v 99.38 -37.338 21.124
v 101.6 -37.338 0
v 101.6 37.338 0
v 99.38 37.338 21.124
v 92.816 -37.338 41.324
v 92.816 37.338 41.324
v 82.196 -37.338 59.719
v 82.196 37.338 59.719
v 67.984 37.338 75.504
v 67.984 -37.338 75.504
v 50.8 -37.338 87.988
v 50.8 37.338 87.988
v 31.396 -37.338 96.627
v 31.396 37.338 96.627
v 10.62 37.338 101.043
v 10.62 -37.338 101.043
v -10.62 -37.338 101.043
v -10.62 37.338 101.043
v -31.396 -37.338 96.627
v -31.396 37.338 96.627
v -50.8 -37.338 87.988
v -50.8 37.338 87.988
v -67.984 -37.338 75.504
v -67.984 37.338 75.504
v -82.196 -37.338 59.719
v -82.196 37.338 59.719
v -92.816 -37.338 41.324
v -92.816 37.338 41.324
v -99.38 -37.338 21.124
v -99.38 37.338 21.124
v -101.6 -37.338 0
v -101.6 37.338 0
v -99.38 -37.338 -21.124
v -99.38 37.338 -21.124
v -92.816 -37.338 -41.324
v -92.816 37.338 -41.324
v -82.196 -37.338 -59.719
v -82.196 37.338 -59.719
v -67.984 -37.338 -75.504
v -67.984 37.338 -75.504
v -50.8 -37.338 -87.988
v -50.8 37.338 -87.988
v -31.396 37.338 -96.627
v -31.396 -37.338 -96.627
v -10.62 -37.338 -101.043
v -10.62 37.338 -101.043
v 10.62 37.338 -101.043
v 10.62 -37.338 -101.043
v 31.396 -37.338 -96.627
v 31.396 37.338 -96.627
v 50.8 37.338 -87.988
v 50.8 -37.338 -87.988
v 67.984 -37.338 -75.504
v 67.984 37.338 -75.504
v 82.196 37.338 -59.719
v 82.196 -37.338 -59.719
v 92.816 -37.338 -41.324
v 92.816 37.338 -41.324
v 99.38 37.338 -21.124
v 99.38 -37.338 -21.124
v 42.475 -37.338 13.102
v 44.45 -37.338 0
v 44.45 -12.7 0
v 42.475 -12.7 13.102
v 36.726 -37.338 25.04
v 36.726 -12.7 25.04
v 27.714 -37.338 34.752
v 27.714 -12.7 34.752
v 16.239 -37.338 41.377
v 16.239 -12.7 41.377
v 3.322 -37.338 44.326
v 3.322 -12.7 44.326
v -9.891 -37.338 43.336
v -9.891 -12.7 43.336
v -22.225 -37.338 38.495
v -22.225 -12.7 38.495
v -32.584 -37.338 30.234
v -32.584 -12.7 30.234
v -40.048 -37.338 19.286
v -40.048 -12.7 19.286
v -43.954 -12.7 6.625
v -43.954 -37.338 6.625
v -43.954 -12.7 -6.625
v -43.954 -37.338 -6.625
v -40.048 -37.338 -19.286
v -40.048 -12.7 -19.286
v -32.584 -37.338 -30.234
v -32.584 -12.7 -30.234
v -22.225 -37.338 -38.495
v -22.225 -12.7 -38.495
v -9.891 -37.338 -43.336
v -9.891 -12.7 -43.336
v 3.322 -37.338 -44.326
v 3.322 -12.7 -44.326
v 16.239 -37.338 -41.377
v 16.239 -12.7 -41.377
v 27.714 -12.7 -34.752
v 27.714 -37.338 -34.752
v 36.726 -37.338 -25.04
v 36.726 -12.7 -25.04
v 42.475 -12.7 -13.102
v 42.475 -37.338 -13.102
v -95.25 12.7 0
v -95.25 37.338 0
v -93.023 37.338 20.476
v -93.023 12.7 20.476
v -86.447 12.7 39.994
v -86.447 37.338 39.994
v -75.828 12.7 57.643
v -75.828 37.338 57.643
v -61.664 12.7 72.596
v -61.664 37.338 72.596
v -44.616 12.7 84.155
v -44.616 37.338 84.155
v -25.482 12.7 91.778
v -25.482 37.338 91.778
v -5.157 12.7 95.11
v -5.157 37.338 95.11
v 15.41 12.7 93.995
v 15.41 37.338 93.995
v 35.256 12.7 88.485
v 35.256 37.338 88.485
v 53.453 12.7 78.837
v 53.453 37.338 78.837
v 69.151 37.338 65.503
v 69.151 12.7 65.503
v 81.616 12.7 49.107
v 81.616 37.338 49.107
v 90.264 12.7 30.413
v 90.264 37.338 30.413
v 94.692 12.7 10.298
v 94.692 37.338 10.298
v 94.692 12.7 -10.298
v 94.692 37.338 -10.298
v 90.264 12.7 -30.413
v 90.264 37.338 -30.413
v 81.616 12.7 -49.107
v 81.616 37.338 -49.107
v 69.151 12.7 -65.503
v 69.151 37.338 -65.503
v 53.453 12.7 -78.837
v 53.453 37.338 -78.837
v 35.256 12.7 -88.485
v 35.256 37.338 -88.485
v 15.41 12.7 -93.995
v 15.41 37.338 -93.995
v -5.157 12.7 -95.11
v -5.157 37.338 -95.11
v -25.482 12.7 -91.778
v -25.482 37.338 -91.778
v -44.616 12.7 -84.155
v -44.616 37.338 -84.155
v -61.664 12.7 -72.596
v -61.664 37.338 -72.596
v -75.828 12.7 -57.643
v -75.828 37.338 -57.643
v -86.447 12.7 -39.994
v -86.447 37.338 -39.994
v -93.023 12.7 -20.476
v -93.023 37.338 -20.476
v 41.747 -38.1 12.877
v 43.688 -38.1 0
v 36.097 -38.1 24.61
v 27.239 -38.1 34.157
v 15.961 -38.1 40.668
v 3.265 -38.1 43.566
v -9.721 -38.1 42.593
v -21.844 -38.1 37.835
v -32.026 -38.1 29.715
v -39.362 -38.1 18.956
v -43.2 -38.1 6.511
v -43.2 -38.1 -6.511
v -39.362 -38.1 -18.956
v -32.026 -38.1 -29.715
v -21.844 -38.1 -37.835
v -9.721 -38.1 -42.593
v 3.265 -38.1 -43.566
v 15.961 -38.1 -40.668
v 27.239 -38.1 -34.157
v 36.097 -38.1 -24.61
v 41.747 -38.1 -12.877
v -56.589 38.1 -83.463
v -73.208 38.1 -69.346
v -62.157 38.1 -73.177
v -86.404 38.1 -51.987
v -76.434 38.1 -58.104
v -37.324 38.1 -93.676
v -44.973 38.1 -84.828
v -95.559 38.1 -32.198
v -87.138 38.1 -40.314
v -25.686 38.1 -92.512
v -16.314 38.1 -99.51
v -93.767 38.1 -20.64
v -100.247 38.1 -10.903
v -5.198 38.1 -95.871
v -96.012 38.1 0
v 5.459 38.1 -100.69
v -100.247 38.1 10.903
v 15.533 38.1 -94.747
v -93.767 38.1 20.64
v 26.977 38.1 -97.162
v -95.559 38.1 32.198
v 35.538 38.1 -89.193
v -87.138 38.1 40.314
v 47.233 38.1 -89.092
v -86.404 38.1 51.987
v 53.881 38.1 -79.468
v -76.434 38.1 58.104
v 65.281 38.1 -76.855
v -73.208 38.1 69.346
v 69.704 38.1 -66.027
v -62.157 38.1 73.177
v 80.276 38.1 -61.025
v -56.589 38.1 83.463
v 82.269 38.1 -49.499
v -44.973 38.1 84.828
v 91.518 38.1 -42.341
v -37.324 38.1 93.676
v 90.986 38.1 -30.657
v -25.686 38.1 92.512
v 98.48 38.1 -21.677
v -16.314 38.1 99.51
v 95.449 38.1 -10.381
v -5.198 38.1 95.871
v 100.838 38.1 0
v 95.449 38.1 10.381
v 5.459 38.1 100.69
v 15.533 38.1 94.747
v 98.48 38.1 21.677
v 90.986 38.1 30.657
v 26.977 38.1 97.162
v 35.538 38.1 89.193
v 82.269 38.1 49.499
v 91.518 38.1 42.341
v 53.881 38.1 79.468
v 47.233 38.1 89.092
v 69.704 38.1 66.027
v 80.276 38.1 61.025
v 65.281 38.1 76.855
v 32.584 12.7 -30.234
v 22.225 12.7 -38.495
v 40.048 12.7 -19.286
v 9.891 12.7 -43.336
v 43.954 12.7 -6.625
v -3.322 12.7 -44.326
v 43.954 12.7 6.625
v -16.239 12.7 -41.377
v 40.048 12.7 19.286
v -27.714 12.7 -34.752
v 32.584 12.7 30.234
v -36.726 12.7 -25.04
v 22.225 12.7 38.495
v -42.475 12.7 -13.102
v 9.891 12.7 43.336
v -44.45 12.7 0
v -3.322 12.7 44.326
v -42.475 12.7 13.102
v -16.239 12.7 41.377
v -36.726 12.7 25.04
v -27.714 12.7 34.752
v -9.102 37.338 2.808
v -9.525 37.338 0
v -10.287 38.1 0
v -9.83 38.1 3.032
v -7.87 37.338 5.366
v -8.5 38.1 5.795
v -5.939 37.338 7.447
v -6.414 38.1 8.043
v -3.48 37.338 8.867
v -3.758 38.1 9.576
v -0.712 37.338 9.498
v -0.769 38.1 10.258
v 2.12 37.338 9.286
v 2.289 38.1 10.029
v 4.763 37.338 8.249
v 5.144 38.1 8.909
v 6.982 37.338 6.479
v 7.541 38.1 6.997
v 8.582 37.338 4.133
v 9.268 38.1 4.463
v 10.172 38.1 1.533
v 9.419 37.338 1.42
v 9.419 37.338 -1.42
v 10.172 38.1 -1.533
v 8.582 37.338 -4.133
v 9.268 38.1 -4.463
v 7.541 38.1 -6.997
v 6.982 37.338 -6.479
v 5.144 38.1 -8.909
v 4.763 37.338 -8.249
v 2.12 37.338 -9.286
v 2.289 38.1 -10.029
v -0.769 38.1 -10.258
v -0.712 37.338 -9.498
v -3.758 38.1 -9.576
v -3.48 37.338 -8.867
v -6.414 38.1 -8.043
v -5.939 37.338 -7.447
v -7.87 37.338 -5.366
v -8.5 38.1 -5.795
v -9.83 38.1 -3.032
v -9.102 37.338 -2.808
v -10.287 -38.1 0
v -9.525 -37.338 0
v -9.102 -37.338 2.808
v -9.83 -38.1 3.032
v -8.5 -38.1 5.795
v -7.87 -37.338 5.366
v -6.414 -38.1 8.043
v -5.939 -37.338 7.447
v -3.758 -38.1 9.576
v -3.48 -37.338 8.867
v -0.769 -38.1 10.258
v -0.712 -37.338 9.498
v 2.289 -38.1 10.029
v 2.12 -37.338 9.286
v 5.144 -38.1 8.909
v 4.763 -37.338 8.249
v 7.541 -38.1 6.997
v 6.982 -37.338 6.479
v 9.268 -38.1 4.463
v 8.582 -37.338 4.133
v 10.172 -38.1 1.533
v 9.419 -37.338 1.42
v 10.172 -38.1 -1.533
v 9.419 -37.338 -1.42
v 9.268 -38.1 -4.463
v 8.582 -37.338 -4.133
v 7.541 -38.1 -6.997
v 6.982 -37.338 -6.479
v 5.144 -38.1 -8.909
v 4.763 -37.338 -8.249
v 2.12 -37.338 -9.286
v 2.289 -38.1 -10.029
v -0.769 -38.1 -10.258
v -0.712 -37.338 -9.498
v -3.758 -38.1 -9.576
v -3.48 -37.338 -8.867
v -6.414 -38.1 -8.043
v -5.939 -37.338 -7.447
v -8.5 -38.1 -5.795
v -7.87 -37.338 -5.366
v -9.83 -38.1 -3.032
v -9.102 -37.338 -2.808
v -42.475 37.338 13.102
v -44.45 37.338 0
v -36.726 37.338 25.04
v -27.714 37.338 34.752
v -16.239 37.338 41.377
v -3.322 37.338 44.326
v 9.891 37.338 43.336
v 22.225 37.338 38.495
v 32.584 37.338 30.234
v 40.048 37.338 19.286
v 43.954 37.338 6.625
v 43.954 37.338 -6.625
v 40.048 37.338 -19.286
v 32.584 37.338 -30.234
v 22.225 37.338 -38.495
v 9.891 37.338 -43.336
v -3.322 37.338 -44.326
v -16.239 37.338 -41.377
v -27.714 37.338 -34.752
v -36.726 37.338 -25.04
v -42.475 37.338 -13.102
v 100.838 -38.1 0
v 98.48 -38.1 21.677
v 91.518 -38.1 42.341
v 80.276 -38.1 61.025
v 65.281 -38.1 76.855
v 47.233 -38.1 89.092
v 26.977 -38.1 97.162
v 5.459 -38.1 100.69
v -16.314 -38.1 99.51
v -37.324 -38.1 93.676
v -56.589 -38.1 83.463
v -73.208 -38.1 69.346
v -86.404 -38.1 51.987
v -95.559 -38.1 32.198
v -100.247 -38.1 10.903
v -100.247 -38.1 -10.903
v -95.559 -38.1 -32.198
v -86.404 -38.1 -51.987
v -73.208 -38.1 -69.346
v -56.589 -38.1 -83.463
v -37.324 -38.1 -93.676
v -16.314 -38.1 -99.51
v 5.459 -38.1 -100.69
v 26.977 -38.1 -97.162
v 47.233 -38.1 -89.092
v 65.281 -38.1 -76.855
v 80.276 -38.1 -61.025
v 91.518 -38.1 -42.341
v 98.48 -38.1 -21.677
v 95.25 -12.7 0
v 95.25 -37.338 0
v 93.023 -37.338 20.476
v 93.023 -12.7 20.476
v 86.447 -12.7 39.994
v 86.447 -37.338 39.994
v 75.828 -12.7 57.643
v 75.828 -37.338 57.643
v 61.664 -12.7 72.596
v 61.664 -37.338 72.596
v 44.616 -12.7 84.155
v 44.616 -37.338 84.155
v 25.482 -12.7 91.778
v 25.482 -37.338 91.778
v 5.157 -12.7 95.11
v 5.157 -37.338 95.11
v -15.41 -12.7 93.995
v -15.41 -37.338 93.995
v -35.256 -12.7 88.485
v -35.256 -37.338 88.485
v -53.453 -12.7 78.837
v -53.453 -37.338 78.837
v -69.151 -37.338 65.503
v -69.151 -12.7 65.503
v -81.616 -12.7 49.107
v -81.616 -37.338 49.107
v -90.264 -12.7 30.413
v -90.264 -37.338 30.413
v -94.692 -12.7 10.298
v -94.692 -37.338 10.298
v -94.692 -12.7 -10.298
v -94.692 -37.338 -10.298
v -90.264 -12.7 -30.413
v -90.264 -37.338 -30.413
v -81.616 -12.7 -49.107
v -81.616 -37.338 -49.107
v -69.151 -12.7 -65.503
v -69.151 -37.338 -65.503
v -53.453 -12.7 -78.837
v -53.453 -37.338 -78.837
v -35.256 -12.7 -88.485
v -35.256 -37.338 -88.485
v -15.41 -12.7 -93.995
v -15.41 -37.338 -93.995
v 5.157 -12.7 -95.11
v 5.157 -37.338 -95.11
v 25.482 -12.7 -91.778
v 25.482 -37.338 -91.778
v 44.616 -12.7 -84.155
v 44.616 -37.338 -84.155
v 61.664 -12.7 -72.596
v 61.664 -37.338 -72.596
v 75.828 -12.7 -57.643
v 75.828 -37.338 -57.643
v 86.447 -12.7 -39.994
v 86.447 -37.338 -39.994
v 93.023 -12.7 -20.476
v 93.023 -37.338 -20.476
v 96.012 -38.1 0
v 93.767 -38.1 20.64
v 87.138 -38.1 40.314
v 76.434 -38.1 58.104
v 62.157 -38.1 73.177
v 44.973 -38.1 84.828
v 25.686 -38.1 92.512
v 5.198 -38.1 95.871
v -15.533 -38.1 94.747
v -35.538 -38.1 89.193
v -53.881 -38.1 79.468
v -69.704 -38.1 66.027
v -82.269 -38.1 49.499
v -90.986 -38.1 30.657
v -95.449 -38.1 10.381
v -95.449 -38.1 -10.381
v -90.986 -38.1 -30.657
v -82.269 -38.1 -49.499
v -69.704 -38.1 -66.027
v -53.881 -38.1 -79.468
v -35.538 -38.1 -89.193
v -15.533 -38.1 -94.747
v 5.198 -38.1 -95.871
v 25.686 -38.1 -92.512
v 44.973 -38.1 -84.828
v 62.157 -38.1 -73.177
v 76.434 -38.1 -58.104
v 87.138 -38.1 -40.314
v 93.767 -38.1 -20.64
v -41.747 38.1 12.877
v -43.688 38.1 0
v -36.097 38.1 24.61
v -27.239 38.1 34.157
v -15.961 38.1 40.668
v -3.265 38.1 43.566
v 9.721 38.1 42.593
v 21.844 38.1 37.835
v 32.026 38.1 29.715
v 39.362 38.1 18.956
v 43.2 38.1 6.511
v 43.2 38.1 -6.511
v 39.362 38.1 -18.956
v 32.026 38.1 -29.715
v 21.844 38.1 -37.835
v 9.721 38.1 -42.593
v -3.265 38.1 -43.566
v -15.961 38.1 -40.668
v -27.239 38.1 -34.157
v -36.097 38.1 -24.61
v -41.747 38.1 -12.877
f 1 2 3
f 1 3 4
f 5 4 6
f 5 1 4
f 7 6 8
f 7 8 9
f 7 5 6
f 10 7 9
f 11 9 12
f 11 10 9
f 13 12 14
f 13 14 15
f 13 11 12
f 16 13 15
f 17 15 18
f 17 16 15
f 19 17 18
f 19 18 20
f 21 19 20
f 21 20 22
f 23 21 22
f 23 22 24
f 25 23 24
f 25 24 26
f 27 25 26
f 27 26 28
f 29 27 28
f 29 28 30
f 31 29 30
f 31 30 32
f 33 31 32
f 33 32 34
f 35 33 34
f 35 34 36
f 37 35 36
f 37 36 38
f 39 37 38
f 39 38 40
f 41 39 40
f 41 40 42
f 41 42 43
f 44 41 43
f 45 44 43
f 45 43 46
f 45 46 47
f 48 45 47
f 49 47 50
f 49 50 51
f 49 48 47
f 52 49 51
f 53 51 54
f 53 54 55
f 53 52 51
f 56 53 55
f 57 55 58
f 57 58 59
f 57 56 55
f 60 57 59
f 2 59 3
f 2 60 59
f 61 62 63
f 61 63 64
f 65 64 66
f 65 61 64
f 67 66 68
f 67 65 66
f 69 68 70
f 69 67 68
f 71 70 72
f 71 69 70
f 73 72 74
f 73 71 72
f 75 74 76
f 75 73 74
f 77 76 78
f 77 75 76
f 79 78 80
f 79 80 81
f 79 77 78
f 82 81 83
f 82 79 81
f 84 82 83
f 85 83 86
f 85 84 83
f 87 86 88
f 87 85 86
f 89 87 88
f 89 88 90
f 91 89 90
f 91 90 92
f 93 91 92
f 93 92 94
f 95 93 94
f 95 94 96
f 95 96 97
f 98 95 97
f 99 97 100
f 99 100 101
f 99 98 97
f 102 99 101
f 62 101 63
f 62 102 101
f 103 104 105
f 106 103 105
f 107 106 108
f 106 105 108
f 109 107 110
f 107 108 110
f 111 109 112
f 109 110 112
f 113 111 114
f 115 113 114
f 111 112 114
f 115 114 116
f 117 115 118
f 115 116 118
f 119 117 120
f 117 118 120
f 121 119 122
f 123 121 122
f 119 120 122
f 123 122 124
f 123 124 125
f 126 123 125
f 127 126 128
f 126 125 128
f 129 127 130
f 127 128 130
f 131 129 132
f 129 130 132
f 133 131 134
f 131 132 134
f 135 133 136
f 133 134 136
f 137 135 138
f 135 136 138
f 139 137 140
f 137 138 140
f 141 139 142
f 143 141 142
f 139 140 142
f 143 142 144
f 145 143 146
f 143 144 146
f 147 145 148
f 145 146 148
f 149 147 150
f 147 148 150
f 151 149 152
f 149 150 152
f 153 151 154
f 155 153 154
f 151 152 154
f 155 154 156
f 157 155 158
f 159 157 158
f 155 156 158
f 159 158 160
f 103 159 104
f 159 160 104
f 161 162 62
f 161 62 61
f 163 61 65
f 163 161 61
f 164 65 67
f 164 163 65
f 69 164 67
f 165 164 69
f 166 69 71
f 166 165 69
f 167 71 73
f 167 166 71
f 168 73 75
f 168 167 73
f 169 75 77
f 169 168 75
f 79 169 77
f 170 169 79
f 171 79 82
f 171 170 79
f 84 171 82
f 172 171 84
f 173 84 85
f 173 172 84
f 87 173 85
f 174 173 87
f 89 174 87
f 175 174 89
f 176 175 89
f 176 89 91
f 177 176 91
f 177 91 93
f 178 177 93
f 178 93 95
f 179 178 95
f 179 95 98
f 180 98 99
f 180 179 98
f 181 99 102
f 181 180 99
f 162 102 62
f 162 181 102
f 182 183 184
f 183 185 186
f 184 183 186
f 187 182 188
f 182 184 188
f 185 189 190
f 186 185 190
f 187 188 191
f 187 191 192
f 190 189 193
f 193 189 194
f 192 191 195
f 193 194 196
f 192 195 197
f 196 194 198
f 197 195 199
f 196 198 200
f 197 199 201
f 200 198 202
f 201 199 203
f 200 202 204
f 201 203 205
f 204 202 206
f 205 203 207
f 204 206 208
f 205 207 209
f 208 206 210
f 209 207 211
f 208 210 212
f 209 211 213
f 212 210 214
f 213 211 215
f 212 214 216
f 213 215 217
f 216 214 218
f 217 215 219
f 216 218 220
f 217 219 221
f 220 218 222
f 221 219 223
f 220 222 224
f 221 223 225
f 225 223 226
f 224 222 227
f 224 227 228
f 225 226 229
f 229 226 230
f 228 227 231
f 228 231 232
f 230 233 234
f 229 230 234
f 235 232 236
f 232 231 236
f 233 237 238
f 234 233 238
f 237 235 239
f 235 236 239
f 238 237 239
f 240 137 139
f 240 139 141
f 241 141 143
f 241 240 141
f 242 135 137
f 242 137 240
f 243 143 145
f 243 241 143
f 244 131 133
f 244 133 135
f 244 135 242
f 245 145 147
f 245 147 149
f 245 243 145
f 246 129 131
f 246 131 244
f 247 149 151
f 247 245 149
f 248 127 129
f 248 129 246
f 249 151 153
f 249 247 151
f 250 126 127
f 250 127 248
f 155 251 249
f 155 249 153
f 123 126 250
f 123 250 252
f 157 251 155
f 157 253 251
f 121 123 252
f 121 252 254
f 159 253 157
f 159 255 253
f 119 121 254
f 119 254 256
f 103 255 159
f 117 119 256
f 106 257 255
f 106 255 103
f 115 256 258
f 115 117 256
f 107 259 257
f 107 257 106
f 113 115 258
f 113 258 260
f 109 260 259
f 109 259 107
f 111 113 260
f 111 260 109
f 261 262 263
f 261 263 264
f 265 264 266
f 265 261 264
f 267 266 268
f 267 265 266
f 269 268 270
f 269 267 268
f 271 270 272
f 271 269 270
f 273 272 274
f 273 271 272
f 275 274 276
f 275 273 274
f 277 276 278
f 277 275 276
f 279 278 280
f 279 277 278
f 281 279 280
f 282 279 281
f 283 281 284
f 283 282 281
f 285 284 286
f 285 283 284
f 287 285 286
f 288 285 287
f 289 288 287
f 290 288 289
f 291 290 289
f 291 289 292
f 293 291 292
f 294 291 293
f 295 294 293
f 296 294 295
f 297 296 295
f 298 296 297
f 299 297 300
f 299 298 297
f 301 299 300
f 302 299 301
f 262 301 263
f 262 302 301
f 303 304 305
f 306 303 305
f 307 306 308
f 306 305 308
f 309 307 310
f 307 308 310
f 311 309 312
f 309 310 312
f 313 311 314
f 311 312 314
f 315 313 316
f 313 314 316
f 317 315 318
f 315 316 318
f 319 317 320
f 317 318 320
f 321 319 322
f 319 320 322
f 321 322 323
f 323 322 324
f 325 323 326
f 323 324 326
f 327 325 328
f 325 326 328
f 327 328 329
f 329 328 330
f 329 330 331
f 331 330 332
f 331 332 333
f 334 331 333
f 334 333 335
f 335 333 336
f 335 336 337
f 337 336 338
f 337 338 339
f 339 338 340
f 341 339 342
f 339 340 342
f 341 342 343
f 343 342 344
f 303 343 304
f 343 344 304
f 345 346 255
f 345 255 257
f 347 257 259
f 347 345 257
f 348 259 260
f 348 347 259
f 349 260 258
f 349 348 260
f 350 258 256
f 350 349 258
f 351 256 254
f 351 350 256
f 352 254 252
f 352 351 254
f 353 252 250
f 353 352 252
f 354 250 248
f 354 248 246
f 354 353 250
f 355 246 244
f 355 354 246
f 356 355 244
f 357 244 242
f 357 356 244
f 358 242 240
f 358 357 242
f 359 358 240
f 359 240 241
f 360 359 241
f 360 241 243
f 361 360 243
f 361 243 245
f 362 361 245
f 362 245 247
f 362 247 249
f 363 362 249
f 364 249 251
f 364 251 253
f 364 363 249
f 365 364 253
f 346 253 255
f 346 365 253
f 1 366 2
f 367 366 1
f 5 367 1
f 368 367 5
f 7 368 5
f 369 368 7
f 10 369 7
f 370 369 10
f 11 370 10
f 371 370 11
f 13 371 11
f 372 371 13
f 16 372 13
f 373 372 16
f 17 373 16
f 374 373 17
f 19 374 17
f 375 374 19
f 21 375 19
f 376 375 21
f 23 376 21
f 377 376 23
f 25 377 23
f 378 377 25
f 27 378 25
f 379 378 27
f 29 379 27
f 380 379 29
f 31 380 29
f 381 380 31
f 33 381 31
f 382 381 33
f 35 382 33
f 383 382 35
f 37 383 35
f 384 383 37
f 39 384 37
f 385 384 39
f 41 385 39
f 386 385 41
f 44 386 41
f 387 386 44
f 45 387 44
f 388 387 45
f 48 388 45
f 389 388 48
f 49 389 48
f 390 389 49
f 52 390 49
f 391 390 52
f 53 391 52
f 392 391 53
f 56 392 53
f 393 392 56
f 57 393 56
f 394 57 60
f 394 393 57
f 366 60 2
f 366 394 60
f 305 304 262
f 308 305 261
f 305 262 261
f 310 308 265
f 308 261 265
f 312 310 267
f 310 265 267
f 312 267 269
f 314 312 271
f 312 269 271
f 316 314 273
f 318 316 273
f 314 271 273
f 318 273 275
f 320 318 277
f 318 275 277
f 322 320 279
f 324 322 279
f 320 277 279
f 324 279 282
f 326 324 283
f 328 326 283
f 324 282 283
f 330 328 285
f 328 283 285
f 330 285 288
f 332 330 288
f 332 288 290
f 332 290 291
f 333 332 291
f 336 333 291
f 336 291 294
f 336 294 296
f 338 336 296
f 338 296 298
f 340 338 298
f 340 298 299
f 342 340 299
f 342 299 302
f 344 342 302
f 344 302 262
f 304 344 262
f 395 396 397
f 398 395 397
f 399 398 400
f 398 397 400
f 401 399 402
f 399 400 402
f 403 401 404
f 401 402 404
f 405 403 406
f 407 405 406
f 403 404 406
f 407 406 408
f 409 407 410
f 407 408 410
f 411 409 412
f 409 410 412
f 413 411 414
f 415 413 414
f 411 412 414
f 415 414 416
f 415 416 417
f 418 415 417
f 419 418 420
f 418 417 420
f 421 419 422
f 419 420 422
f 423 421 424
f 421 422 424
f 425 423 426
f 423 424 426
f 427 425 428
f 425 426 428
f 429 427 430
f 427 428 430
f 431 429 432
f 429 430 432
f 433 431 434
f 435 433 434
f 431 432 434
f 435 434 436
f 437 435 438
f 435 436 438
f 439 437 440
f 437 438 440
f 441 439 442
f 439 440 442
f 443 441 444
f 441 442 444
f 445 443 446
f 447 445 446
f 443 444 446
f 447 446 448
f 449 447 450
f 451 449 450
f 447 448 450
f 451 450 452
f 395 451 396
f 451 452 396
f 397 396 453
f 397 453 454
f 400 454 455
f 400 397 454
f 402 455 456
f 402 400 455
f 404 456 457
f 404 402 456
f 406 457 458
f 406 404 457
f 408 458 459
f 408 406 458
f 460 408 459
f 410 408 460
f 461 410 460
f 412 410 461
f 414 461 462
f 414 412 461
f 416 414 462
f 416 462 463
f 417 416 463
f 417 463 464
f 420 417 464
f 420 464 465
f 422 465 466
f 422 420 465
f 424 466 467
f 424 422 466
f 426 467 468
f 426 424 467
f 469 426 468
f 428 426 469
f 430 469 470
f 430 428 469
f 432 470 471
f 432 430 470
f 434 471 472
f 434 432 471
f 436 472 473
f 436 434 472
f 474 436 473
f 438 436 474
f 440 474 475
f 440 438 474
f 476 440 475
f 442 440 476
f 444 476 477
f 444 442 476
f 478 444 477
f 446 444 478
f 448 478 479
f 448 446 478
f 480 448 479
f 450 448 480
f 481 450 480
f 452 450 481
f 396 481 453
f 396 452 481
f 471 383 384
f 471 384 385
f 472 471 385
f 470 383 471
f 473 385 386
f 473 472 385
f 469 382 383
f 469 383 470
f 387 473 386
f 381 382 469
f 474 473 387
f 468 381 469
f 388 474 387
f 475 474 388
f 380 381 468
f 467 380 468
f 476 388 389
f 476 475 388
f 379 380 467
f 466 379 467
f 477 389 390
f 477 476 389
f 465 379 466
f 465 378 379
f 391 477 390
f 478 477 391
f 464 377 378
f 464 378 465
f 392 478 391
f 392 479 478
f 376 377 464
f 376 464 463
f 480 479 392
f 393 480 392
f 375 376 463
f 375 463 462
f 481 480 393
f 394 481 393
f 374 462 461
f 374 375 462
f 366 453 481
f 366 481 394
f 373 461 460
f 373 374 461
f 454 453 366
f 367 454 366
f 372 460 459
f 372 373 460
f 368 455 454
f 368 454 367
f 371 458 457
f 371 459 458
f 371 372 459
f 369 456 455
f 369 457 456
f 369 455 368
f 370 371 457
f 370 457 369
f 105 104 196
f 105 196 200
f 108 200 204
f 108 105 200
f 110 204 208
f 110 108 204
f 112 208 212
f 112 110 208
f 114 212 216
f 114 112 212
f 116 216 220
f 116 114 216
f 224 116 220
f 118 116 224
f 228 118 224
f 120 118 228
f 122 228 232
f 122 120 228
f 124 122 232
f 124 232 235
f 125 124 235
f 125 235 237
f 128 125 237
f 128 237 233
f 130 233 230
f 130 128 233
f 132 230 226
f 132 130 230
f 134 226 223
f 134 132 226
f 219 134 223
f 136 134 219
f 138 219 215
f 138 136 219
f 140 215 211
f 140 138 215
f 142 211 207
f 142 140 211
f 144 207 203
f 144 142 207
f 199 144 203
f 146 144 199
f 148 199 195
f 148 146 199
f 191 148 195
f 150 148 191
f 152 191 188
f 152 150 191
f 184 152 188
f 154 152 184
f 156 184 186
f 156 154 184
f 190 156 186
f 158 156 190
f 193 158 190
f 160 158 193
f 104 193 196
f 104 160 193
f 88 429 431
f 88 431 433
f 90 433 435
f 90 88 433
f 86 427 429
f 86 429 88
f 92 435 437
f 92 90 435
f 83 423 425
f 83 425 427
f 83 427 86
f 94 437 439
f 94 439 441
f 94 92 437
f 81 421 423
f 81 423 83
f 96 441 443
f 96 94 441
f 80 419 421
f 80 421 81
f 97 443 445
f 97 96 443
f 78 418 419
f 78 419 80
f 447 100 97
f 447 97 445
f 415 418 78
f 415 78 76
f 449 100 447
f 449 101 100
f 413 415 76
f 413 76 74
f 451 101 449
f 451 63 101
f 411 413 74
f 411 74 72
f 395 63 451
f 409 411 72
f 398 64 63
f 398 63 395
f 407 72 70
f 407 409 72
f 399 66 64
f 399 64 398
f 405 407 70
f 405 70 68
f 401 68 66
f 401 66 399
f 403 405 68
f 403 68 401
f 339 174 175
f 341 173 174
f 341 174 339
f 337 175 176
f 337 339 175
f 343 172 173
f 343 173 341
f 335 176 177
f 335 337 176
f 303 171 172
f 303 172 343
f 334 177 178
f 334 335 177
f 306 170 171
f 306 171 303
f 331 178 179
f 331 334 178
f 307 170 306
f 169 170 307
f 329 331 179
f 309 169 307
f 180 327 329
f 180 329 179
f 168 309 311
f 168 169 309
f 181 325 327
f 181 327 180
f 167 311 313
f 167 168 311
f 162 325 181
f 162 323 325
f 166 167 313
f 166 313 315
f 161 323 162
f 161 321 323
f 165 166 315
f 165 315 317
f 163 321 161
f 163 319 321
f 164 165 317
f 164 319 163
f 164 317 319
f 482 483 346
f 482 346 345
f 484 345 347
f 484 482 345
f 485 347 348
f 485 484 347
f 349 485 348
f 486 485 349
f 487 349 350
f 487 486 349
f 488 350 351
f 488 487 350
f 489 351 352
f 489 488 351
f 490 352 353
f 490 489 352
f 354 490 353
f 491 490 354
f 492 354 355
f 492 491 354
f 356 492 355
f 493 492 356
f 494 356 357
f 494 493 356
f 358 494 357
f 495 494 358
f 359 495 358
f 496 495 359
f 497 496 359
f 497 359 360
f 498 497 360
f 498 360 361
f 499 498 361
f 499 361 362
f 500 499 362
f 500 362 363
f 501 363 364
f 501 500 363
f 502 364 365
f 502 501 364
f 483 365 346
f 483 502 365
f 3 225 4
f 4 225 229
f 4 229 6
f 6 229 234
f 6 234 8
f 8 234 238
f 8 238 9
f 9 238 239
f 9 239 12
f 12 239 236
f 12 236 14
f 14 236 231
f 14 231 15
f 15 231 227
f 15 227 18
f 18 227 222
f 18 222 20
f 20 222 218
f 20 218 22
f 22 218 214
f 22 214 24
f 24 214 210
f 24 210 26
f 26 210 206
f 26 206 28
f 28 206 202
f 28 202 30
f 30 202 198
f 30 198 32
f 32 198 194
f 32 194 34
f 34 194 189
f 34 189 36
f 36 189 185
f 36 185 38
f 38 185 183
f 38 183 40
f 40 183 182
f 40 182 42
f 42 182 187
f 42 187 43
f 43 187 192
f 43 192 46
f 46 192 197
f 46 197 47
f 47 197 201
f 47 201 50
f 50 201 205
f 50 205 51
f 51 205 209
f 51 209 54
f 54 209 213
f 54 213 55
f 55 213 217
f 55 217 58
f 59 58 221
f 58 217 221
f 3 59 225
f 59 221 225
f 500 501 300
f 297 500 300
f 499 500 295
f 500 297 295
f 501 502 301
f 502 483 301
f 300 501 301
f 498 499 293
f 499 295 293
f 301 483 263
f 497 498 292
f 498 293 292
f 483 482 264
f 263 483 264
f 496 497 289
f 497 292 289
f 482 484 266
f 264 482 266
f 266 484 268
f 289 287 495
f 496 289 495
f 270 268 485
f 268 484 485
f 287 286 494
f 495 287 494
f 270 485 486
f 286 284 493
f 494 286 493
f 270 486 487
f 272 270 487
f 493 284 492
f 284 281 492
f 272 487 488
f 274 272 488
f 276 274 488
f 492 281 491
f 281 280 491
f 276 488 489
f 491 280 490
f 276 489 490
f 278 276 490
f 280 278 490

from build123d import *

# Parameters (mm, degrees)
F0_R     = 101.6
F1_DEPTH = 38.1
F2_R     = 95.25
F2_R_2   = 44.45
F3_DEPTH = 25.4
F4_R     = 95.25
F4_R_2   = 44.45
F5_DEPTH = 25.4
F7_D     = 19.05
F8_SIZE  = 0.762


with BuildPart() as f1:
    # F0 (on Front) → F1 (new body, symmetric)
    with BuildSketch(Plane.XZ):
        Circle(F0_R)
    extrude(amount=F1_DEPTH, both=True)

    # F2 (on face) → F3 (cut)
    with BuildSketch(Plane.XZ.offset(38.1)):
        Circle(F2_R)
        Circle(F2_R_2, mode=Mode.SUBTRACT)
    extrude(amount=-F3_DEPTH, mode=Mode.SUBTRACT)

    # F4 (on face) → F5 (cut)
    with BuildSketch(Plane(origin=(0, 38.1, 0), x_dir=(-1, 0, 0), z_dir=(0, 1, 0))):
        Circle(F4_R)
        Circle(F4_R_2, mode=Mode.SUBTRACT)
    extrude(amount=-F5_DEPTH, mode=Mode.SUBTRACT)

    # F7 (through all)
    with Locations(Plane.XZ.offset(38.1)):
        with Locations((0, 0)):
            Hole(F7_D / 2)

    # F8
    f8_edges = [f1.edges().sort_by_distance(p)[0] for p in [
        (-44.45, -38.1, 0),
        (-95.25, -38.1, 0),
        (-101.6, -38.1, 0),
        (44.45, 38.1, 0),
        (95.25, 38.1, 0),
        (-101.6, 38.1, 0),
        (-9.525, 38.1, 0),
        (-9.525, -38.1, 0),
    ]]
    chamfer(f8_edges, length=F8_SIZE)


solid = f1.part
